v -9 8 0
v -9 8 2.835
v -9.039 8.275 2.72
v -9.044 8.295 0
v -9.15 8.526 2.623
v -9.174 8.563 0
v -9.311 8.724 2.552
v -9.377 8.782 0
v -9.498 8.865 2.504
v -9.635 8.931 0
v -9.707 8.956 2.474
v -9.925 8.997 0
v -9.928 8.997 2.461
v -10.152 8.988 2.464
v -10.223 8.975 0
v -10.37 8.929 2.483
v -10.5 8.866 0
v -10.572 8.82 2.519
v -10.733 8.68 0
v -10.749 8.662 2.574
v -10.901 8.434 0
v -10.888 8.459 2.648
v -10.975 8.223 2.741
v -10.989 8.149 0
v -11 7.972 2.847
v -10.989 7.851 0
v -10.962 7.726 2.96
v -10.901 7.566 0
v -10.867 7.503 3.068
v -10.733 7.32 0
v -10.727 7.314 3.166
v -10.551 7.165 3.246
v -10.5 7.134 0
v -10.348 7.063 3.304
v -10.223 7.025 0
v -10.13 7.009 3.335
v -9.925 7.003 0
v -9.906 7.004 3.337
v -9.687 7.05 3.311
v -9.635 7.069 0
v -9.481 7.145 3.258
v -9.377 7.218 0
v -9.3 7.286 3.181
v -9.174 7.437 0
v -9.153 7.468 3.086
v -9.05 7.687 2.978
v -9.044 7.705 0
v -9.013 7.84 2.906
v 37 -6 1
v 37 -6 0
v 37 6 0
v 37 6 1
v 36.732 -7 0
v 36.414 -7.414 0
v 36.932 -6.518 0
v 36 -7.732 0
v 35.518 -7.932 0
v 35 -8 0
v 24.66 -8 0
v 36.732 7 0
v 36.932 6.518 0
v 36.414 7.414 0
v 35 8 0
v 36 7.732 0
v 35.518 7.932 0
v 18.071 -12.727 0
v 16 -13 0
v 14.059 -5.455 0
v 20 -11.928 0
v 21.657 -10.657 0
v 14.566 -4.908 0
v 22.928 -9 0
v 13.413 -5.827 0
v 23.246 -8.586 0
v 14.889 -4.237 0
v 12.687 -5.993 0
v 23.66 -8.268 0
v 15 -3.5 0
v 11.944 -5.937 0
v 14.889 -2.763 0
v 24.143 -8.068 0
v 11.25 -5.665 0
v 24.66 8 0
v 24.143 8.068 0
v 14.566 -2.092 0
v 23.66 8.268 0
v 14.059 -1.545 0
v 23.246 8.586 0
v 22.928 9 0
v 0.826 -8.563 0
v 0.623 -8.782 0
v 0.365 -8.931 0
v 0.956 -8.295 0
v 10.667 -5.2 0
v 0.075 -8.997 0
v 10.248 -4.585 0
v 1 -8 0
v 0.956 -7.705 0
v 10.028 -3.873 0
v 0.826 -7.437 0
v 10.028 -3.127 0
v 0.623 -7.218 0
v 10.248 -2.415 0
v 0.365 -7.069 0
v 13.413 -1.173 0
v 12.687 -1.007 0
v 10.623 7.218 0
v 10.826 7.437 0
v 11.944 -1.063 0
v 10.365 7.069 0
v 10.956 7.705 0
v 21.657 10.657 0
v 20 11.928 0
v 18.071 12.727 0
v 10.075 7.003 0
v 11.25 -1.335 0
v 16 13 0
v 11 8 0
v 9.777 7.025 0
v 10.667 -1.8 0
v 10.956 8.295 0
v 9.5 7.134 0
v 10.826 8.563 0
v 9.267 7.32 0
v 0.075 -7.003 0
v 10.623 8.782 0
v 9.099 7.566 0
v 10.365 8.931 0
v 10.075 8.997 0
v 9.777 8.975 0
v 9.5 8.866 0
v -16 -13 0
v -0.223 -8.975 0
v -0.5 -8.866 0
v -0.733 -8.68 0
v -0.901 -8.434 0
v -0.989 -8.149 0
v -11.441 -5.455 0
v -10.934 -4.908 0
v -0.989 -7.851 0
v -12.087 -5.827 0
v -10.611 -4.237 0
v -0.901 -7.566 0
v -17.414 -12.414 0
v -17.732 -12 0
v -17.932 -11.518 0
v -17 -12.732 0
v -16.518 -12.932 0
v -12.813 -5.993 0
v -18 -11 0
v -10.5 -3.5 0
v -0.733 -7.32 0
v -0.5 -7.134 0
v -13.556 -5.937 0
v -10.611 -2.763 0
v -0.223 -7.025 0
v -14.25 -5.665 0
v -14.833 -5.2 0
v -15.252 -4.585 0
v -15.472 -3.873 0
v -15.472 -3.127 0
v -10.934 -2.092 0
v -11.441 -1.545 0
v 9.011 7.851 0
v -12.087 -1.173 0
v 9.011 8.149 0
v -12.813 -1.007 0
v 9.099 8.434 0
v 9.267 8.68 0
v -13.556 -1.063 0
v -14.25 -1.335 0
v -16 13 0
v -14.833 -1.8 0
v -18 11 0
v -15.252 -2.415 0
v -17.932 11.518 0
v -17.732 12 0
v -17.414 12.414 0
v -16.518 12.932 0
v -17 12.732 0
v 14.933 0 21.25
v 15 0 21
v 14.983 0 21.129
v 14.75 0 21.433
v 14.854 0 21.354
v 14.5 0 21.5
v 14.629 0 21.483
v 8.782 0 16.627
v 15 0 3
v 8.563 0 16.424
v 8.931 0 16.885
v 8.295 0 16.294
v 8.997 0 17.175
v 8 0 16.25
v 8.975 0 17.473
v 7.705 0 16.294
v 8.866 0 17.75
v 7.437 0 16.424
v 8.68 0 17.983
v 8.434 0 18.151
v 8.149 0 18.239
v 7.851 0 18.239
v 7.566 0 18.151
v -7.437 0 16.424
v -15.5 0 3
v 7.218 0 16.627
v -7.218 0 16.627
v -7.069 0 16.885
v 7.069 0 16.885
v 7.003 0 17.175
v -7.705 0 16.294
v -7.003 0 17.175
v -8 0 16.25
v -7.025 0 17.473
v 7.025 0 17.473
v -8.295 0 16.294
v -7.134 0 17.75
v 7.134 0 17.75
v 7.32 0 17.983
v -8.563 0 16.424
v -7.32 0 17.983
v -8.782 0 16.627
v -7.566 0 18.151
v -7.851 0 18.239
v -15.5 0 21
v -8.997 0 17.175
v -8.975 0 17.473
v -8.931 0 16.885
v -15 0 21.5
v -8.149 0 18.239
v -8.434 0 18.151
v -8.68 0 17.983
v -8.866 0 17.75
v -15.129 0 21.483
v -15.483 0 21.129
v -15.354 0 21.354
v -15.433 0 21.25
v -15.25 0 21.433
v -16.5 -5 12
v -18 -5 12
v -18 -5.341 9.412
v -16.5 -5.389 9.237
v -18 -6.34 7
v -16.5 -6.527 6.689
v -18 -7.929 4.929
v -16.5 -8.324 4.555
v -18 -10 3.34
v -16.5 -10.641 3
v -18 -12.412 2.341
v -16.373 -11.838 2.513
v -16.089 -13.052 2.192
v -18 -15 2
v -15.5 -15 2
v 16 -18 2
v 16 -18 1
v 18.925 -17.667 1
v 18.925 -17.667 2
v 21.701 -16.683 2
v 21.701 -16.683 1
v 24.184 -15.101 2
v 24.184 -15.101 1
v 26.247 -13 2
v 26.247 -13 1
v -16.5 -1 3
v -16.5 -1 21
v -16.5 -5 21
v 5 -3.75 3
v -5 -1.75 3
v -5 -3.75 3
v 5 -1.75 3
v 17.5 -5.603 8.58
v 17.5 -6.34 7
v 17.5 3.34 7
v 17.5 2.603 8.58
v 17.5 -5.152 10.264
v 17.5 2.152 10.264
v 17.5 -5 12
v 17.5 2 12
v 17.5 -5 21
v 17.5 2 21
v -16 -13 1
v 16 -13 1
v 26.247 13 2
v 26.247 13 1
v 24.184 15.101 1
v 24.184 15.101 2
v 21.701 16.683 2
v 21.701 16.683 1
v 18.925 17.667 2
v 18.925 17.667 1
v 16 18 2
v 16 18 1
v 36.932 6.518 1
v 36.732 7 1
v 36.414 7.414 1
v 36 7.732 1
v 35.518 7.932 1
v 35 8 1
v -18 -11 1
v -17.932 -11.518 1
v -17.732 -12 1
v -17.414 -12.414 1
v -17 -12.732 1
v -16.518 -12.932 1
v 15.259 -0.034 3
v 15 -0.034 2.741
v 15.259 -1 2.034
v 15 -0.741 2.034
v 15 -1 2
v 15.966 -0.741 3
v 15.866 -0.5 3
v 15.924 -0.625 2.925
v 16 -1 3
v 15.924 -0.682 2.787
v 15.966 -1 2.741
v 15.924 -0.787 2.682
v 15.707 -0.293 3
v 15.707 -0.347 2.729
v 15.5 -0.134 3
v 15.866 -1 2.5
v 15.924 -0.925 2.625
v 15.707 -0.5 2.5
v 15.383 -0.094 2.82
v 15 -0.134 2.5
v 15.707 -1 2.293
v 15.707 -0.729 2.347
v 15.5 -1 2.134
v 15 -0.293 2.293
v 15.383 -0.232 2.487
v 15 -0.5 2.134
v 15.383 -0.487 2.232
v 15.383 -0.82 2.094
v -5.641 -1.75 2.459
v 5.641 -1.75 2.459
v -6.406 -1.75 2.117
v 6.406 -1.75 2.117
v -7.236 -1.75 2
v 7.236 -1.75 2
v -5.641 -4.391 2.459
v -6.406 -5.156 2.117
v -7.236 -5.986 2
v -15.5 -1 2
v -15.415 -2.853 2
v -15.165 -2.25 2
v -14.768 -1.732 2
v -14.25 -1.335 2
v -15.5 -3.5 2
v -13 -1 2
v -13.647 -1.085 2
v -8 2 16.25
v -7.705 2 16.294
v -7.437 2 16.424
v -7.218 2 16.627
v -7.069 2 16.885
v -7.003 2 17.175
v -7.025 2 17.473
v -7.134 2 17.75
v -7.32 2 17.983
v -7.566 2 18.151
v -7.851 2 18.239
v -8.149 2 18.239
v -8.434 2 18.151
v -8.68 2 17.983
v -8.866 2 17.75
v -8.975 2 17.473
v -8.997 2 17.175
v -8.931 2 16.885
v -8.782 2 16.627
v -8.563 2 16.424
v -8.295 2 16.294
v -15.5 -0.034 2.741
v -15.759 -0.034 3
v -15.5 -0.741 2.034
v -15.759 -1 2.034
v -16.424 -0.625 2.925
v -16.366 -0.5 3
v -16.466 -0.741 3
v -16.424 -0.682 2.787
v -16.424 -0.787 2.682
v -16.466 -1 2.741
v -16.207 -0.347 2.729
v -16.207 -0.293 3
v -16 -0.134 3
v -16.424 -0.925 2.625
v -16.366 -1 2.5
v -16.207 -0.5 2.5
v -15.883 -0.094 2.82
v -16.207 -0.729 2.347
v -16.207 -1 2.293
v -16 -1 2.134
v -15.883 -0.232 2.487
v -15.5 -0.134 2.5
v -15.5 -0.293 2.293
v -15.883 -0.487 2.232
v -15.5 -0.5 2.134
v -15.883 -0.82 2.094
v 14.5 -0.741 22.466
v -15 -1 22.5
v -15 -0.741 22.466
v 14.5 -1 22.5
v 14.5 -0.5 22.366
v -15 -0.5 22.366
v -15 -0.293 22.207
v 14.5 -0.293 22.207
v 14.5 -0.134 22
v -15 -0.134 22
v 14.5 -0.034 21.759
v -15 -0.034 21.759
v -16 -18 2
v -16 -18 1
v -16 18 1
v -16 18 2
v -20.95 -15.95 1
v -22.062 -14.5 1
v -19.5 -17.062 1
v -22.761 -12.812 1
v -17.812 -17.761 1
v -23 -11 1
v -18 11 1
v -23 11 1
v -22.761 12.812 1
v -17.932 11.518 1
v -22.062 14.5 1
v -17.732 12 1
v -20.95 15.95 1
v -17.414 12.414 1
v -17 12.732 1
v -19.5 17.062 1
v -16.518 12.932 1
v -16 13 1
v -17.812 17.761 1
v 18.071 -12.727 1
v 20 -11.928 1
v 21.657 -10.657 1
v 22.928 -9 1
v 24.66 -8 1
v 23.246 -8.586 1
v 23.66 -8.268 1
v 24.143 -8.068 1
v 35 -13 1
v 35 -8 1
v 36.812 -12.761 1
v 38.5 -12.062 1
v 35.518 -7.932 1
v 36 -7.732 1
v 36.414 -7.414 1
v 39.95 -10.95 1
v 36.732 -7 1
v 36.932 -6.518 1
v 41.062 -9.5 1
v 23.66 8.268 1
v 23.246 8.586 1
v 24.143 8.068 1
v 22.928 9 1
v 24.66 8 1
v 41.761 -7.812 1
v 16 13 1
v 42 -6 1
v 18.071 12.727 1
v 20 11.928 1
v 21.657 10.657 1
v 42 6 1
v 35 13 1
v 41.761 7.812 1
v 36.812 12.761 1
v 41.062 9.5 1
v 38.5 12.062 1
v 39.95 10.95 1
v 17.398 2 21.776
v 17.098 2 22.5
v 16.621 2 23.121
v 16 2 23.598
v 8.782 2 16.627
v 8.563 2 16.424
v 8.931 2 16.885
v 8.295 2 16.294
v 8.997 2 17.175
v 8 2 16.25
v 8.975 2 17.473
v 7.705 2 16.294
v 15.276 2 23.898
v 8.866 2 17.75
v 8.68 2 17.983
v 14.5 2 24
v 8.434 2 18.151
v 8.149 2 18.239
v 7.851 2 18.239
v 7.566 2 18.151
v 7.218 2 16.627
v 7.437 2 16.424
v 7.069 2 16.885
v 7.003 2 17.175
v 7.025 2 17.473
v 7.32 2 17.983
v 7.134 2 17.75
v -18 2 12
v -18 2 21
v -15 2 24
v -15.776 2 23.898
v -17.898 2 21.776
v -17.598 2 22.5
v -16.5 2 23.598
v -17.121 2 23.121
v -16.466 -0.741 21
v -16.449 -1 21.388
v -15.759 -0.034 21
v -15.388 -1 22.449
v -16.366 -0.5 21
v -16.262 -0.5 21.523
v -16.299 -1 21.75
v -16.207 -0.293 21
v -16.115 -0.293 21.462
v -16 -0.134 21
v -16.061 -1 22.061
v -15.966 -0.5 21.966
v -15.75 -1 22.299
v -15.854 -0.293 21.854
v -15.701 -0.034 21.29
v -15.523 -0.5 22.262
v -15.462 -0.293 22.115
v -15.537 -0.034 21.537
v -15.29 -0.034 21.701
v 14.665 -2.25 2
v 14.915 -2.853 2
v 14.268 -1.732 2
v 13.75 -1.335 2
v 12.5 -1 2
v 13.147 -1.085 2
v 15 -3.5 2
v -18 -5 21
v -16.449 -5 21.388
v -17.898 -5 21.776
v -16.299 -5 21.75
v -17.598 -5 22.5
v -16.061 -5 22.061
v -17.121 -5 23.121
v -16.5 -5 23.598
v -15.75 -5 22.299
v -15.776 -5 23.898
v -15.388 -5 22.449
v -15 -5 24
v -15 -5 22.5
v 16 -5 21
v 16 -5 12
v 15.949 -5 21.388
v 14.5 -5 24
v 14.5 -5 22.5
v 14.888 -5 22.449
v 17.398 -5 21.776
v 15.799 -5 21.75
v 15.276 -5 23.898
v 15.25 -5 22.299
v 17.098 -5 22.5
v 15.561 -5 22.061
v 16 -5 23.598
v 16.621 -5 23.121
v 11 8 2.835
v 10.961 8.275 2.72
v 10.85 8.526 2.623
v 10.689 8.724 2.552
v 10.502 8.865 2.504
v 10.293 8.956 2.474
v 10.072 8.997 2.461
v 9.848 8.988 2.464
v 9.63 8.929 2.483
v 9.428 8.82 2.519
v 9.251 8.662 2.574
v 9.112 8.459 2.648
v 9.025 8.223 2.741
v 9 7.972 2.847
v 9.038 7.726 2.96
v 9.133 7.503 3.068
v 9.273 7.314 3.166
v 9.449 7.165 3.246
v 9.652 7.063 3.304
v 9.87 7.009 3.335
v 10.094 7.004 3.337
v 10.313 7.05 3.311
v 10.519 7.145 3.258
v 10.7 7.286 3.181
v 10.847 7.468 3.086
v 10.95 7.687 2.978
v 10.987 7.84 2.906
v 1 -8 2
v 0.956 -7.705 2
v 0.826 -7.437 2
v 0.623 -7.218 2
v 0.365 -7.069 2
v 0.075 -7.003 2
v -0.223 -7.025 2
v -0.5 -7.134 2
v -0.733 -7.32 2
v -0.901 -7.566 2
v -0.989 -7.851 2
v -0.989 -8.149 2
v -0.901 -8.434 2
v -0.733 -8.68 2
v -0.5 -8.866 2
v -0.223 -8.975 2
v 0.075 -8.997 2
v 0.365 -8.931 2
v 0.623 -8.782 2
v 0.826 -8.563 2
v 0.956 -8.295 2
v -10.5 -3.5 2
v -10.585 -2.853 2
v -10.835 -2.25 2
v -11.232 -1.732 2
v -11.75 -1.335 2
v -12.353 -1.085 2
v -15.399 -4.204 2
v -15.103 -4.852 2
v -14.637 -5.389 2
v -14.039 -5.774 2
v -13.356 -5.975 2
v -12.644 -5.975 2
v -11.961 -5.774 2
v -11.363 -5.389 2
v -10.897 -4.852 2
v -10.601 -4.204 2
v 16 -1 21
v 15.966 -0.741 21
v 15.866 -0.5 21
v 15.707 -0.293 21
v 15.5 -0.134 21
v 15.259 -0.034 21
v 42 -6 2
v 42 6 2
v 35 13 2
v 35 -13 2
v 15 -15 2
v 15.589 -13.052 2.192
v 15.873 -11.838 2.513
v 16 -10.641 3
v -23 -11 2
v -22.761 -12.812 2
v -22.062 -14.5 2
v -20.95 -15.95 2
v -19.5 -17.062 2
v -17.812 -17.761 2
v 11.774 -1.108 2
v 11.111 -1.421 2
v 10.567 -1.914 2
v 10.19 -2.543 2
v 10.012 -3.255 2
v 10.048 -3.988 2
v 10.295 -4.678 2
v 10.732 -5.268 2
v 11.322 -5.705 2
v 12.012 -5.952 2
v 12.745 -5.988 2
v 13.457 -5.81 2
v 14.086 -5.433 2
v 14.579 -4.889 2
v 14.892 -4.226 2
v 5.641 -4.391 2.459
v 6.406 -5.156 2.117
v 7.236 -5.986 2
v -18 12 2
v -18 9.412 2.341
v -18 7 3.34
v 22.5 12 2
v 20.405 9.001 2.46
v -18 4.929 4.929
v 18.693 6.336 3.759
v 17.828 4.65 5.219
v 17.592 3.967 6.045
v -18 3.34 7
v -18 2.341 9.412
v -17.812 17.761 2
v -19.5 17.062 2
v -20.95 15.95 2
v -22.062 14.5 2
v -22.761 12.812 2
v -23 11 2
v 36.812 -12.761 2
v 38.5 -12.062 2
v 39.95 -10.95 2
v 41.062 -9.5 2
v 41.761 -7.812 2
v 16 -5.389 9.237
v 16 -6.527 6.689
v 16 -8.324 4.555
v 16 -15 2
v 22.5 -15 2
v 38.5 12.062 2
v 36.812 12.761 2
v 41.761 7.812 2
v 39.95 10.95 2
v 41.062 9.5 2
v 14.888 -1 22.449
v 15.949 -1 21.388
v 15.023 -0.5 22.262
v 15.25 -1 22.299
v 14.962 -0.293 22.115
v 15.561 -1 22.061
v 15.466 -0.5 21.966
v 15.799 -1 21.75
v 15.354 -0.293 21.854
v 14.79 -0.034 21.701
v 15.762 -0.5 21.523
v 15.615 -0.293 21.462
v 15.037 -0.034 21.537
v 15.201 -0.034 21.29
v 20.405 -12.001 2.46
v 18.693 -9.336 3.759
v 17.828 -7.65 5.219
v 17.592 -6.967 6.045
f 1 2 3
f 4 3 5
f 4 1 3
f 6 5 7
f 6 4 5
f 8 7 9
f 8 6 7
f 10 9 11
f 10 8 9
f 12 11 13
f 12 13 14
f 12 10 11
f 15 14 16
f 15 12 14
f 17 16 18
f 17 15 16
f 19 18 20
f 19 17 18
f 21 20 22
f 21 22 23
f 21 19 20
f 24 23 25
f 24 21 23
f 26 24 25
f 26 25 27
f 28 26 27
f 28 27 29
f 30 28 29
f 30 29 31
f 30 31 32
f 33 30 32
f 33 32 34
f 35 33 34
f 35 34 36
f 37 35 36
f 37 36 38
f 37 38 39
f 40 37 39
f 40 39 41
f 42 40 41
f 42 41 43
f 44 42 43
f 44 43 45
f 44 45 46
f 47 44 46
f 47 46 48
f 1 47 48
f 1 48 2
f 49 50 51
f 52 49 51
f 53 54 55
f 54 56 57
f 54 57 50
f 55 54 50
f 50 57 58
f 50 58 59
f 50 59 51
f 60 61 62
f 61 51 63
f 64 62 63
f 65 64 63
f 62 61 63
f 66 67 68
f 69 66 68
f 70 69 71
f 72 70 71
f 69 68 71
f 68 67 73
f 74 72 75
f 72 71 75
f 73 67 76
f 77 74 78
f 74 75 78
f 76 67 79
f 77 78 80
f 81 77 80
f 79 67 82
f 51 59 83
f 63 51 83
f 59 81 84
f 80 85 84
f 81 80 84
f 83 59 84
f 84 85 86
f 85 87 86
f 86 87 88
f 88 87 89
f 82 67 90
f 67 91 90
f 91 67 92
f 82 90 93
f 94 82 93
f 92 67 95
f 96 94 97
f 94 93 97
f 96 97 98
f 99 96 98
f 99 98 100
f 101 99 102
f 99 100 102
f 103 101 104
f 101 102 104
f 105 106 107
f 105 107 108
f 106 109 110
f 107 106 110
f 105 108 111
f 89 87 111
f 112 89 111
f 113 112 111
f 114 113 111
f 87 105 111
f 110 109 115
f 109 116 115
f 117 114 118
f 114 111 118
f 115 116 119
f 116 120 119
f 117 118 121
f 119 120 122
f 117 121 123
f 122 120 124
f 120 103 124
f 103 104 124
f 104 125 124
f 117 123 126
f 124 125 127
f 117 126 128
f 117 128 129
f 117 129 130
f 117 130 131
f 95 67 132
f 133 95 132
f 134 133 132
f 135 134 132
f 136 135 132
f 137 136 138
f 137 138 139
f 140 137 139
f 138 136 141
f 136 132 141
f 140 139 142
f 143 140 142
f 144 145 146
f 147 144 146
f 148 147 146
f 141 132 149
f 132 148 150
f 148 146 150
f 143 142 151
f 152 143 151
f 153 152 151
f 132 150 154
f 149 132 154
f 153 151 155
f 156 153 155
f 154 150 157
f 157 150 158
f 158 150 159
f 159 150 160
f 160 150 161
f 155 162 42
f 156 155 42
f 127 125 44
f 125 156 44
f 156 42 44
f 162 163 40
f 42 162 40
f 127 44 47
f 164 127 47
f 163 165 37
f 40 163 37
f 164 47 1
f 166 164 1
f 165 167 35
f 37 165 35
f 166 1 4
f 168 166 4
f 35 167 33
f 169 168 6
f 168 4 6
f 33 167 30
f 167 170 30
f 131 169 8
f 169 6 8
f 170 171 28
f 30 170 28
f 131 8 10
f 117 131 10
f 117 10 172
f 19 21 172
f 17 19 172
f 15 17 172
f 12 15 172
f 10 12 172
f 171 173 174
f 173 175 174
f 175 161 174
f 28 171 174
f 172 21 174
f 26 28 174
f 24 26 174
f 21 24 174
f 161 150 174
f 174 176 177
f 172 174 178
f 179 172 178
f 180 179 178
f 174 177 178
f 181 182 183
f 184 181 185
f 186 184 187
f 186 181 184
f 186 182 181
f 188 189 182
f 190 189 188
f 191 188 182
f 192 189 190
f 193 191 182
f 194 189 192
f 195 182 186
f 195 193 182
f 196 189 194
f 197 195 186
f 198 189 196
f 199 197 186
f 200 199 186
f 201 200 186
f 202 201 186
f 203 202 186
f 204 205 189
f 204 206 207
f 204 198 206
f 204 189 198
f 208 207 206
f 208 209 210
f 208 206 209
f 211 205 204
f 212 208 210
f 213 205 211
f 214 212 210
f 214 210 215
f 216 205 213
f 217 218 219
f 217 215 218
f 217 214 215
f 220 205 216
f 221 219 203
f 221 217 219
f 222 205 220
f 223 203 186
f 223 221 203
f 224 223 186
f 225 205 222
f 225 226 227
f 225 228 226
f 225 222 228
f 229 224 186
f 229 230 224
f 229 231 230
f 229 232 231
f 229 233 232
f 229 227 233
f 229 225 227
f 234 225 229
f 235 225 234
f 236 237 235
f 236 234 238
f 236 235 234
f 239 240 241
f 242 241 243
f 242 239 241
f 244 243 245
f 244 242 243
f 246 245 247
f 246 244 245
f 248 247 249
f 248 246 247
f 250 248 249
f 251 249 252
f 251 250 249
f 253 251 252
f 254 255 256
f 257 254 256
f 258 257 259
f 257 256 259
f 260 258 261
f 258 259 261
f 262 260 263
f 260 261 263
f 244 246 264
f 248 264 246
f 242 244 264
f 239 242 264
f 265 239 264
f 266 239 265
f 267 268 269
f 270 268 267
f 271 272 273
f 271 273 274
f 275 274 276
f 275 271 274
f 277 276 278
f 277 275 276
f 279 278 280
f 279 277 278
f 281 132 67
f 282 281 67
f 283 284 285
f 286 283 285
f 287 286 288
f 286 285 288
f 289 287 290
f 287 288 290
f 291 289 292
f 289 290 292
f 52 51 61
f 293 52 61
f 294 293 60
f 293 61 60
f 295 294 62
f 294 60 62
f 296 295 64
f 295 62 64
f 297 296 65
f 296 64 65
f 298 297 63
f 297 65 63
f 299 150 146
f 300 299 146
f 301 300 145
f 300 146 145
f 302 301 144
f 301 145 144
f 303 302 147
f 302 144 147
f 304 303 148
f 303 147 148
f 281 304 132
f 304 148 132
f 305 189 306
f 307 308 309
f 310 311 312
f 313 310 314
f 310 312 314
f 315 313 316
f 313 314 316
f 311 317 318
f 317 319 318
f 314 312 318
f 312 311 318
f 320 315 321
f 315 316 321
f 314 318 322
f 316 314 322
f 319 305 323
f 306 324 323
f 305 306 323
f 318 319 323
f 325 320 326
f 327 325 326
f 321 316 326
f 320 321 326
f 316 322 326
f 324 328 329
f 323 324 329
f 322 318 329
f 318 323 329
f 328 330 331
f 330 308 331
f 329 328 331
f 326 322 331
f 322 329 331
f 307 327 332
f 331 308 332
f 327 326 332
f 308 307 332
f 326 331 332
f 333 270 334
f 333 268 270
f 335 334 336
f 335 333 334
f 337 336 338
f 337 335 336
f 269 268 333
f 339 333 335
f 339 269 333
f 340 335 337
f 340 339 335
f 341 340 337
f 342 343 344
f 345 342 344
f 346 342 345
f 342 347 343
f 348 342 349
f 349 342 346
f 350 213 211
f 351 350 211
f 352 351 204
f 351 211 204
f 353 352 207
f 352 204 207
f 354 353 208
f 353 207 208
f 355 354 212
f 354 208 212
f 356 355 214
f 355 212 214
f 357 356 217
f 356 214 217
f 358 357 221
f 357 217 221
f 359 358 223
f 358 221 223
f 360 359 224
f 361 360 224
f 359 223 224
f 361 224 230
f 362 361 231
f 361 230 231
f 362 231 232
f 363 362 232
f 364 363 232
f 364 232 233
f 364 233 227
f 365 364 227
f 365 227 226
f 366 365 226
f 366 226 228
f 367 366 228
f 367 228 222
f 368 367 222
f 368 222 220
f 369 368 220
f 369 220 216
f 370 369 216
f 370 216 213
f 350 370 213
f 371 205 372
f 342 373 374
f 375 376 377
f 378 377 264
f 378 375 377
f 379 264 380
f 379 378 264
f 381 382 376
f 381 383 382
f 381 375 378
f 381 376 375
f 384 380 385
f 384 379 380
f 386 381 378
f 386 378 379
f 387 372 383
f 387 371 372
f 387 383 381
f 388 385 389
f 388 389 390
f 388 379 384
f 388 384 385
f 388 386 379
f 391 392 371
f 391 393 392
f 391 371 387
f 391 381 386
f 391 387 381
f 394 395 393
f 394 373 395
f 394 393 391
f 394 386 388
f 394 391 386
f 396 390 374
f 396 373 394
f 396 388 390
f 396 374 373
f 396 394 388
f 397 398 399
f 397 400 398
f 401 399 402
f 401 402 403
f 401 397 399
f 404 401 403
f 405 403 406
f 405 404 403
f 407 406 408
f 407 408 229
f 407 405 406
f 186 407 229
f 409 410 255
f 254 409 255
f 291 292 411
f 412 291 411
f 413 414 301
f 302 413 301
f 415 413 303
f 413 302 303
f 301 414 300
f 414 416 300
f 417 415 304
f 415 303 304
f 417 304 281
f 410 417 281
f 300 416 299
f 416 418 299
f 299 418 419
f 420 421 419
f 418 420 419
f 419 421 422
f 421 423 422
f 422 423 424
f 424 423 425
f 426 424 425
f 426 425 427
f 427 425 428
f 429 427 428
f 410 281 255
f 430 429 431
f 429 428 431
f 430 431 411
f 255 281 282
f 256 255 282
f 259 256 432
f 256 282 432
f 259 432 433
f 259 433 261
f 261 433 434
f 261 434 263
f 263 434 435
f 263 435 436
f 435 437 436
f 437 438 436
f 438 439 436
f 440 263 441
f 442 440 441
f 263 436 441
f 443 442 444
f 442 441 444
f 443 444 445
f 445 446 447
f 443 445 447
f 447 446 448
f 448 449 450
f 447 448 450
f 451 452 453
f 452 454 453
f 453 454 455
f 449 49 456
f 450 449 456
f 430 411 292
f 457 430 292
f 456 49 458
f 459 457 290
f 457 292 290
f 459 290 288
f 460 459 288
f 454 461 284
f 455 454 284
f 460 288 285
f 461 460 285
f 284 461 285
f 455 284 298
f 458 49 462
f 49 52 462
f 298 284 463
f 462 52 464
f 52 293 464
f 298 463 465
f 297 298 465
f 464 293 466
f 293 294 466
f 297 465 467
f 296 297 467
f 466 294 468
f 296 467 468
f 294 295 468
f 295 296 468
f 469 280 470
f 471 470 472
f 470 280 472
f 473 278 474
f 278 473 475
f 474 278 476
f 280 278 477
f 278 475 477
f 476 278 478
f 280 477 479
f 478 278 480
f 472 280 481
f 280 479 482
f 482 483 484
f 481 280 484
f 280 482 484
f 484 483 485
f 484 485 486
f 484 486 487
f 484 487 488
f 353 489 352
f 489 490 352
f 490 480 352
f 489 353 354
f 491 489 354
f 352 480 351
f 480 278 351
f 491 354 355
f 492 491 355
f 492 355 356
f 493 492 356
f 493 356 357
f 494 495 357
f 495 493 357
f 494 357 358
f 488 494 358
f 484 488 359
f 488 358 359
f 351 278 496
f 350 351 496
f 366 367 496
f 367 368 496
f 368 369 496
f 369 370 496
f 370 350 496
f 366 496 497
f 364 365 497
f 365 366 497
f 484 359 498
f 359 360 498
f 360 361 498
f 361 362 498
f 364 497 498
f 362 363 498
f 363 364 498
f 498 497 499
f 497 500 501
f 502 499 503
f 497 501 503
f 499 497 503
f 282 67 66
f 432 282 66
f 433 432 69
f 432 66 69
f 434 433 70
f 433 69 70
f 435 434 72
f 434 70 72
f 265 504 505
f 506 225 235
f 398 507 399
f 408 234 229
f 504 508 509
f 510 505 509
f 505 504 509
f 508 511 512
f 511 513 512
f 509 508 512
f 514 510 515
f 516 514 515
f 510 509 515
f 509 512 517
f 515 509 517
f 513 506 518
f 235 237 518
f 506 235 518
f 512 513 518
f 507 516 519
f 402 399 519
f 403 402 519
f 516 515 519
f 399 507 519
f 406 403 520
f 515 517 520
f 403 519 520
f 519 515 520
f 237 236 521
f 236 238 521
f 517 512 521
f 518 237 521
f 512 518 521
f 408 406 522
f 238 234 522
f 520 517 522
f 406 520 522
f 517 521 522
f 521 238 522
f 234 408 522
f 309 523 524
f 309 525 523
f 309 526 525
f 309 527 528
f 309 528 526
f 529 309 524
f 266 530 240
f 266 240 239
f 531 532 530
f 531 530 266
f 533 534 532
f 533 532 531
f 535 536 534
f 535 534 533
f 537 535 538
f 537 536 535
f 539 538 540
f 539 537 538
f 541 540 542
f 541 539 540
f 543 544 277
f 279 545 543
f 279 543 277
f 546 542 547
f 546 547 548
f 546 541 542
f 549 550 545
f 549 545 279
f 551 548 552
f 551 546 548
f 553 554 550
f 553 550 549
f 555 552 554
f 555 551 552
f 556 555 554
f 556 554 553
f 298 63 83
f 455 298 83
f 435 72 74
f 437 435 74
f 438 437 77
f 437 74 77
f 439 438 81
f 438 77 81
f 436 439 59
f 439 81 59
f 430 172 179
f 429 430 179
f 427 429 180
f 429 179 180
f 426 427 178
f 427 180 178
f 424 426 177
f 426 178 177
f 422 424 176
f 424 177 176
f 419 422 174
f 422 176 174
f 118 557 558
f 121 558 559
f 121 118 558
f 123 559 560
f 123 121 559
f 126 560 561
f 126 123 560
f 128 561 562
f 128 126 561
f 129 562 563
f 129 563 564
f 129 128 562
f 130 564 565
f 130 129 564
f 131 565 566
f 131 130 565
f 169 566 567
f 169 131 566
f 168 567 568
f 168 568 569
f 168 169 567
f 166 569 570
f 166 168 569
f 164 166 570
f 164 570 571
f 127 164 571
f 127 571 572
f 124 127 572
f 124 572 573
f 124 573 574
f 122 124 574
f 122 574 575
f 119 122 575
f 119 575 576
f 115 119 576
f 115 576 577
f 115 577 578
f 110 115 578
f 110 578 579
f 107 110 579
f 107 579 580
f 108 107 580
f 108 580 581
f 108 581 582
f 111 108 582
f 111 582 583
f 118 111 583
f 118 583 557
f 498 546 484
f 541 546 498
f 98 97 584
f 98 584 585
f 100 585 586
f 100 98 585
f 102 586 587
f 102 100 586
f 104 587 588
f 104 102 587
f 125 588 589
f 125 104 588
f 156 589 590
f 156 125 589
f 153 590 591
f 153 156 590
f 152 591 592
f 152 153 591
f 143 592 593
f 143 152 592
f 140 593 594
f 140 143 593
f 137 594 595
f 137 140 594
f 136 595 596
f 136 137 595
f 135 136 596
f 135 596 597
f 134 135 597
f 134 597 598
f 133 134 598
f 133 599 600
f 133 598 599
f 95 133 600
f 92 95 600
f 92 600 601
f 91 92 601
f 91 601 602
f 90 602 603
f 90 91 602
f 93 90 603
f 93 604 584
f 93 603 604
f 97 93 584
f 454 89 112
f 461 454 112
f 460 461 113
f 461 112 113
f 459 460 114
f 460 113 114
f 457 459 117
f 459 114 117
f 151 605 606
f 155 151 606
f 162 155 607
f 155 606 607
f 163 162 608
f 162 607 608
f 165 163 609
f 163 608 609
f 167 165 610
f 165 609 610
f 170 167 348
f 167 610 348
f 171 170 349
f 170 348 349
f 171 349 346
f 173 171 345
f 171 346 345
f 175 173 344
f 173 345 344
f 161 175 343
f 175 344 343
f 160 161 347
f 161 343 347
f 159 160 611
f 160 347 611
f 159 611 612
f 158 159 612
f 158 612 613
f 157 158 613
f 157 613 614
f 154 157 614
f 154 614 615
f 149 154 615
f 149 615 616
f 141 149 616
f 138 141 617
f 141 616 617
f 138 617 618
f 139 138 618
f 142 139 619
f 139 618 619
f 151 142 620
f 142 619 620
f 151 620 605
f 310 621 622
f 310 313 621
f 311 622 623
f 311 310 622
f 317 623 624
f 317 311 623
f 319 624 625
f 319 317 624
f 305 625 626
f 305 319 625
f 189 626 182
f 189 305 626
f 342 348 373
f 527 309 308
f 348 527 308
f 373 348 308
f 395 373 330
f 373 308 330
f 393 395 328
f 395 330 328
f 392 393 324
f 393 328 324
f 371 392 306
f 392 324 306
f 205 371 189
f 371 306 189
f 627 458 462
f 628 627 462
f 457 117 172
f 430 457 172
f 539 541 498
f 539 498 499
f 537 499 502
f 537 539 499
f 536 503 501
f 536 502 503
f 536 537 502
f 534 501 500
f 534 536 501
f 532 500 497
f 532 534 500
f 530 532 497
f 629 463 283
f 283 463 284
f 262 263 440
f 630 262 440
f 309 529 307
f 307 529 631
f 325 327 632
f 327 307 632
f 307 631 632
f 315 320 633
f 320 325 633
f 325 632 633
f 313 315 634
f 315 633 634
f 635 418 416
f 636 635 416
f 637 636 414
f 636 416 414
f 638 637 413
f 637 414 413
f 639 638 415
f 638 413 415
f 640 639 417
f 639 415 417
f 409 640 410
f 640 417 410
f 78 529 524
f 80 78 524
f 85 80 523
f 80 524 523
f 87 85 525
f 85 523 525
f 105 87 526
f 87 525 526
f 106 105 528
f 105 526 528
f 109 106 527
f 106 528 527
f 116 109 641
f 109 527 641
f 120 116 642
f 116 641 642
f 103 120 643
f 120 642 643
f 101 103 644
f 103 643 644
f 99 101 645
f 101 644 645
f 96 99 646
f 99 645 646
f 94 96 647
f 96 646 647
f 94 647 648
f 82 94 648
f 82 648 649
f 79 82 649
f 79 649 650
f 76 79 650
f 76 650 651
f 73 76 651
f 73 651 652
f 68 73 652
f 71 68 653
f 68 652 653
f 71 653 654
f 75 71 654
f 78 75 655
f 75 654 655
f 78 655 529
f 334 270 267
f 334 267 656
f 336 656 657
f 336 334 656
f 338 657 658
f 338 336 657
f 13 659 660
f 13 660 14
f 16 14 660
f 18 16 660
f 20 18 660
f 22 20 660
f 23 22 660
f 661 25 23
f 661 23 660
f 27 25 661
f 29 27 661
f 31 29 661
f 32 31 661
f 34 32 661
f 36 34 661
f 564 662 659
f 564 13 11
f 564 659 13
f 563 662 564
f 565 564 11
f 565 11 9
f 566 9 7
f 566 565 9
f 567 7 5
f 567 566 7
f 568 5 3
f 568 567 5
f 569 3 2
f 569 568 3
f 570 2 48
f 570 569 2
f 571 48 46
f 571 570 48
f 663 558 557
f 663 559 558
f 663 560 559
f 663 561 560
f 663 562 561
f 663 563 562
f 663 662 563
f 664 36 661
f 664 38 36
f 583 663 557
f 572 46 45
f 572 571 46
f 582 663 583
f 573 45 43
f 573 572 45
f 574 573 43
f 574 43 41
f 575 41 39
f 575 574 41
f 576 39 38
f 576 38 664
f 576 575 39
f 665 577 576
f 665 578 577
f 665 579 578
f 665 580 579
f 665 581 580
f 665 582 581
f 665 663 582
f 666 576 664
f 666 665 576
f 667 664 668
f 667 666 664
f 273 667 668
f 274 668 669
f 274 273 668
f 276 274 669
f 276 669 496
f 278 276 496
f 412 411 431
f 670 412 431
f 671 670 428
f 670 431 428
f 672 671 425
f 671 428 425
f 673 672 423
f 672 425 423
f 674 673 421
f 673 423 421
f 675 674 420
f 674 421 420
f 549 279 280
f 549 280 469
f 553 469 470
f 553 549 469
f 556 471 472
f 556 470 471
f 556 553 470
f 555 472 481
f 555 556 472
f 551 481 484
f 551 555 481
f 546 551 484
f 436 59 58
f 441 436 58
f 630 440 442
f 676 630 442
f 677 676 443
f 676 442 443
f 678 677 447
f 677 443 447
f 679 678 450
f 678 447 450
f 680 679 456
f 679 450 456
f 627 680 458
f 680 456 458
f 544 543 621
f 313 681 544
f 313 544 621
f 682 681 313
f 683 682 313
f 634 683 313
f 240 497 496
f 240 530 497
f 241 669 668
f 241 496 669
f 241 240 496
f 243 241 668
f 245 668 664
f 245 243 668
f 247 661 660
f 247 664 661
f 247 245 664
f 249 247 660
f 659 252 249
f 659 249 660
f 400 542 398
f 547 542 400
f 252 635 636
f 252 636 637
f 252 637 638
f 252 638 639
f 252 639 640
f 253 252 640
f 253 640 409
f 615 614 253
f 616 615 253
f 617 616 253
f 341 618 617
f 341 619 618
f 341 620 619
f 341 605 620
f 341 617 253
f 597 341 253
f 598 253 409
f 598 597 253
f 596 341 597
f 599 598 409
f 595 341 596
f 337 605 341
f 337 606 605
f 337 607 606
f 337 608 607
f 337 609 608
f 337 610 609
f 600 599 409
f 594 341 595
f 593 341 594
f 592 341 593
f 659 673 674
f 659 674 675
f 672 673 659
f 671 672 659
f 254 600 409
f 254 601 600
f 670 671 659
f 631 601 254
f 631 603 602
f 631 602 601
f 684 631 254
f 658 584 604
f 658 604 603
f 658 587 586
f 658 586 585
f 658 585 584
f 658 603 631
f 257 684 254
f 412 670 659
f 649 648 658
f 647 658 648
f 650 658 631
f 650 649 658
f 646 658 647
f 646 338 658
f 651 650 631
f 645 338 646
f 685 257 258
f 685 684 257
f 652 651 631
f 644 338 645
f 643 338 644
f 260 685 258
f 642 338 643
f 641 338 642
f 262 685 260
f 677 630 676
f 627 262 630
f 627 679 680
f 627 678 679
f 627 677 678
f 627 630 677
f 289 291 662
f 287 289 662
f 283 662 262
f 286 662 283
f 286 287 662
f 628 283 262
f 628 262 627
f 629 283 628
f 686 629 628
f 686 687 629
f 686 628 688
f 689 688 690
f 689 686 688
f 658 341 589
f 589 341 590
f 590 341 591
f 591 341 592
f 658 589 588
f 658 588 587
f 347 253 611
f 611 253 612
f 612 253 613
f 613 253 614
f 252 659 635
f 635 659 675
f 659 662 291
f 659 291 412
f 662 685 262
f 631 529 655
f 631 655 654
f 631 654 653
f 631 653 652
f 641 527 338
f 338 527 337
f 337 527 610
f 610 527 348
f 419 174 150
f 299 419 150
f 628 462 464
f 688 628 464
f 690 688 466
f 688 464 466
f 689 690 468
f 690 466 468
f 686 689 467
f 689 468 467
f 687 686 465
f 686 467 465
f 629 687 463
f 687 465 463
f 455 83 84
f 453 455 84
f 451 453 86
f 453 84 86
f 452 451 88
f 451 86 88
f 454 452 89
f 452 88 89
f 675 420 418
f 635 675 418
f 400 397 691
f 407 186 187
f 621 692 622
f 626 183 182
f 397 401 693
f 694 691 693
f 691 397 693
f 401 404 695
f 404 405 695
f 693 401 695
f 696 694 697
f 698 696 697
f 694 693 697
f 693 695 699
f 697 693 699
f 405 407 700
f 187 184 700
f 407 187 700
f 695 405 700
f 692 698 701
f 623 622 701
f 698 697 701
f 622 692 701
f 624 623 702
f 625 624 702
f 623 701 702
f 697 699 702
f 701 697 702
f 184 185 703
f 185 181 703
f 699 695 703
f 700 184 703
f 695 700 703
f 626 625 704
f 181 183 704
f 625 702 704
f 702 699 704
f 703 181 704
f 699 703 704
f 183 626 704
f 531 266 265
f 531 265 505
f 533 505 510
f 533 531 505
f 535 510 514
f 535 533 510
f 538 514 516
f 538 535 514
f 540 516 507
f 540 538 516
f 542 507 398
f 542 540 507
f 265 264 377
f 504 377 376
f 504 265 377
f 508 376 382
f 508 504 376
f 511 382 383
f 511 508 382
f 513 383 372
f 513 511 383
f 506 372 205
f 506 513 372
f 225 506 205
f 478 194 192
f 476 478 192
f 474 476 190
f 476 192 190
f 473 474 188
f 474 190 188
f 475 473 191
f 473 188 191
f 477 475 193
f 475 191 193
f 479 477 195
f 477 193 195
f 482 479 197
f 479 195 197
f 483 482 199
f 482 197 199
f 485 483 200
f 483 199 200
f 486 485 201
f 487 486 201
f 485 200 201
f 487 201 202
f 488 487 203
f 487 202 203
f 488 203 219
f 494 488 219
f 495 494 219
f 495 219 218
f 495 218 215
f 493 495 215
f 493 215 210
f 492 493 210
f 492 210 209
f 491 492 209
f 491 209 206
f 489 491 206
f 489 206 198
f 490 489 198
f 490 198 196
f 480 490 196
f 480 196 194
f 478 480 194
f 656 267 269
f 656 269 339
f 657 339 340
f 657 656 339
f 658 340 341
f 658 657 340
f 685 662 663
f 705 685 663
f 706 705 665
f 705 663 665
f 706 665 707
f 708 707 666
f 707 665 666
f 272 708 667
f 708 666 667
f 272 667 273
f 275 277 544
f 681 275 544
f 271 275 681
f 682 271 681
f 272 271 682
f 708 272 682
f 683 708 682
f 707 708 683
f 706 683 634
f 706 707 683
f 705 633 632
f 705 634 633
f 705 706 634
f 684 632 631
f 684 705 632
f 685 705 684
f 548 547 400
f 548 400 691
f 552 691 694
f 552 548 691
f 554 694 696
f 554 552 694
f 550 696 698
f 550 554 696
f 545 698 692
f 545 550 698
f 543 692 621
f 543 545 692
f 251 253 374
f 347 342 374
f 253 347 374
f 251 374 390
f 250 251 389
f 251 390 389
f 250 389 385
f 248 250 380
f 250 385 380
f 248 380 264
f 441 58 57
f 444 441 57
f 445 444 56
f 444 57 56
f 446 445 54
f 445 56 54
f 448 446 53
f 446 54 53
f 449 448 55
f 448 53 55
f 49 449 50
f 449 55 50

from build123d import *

# Parameters (mm, degrees)
INSERT_IN_SHEET_METAL_HOLE_DEPTH  = 1
BOSS_EXTRUDE5_DEPTH               = 1
SKETCH2_W                         = 24
SKETCH2_H                         = 2
LED_BACKING_DEPTH                 = 55
SKETCH3_R                         = 1
LED_SCREWHOLES_DEPTH              = 10
LED_BACKING_CLEANUP_DEPTH         = 52.613951602
LED_BACKING_CLEANUP_DEPTH_BACK    = 52.613951602
SKETCH5_W                         = 19.5
SKETCH5_H                         = 22
FILLET1_R                         = 3
BOSS_EXTRUDE3_START               = 5
BOSS_EXTRUDE3_DEPTH               = 5
FILLET2_R                         = 10
FILLET3_R                         = 5
FILLET4_R                         = 1
SKETCH7_R                         = 2.5
LED_WIRE_HOLES_DEPTH              = 51.714889332
SCREWHOLES_FOR_BACKING_DEPTH      = 51.714889332
SCREWHOLES_FOR_BACKING_DEPTH_BACK = 51.714889332
SKETCH8_R                         = 1
SKETCH9_W                         = 10
SKETCH9_H                         = 2
BOSS_EXTRUDE4_DEPTH               = 1
FILLET5_R                         = 3


with BuildPart() as part:
    # Sketch1 → Insert in sheet metal hole (new body)
    with BuildSketch(Plane.XY):
        with BuildLine():
            Line((-18, 11), (-18, -11))
            ThreePointArc((-18, -11), (-17.414213562, -12.414213562), (-16, -13))
            Line((-16, -13), (16, -13))
            ThreePointArc((16, -13), (20, -11.92820323), (22.92820323, -9))
            ThreePointArc((22.92820323, -9), (23.660254038, -8.267949192), (24.660254038, -8))
            Line((24.660254038, -8), (35, -8))
            ThreePointArc((35, -8), (36.414213562, -7.414213562), (37, -6))
            Line((37, -6), (37, 6))
            ThreePointArc((37, 6), (36.414213562, 7.414213562), (35, 8))
            Line((35, 8), (24.660254038, 8))
            ThreePointArc((24.660254038, 8), (23.660254038, 8.267949192), (22.92820323, 9))
            ThreePointArc((22.92820323, 9), (20, 11.92820323), (16, 13))
            Line((16, 13), (-16, 13))
            ThreePointArc((-16, 13), (-17.414213562, 12.414213562), (-18, 11))
        make_face()
    extrude(amount=INSERT_IN_SHEET_METAL_HOLE_DEPTH)

    # Sketch10 → Boss-Extrude5 (add)
    with BuildSketch(Plane.XY.offset(1)):
        with BuildLine():
            Line((26.246950766, -13), (35, -13))
            ThreePointArc((35, -13), (39.949747468, -10.949747468), (42, -6))
            Line((42, -6), (42, 6))
            ThreePointArc((42, 6), (39.949747468, 10.949747468), (35, 13))
            Line((35, 13), (26.246950766, 13))
            ThreePointArc((26.246950766, 13), (21.700877125, 16.683321446), (16, 18))
            Line((16, 18), (-16, 18))
            ThreePointArc((-16, 18), (-20.949747468, 15.949747468), (-23, 11))
            Line((-23, 11), (-23, -11))
            ThreePointArc((-23, -11), (-20.949747468, -15.949747468), (-16, -18))
            Line((-16, -18), (16, -18))
            ThreePointArc((16, -18), (21.700877125, -16.683321446), (26.246950766, -13))
        make_face()
    extrude(amount=BOSS_EXTRUDE5_DEPTH)

    # Sketch2 → LED backing (add)
    with BuildSketch(Plane.ZY.offset(18)):
        with Locations((12, 1)):
            Rectangle(SKETCH2_W, SKETCH2_H)
    extrude(amount=-LED_BACKING_DEPTH)

    # Sketch3 → LED screwholes (cut)
    with BuildSketch(Plane.XZ):
        with Locations(Location((-8, 17.25, 0), (0, 0, 270))):
            Circle(SKETCH3_R)
        with Locations(Location((8, 17.25, 0), (0, 0, 270))):
            Circle(SKETCH3_R)
    extrude(amount=-LED_SCREWHOLES_DEPTH, mode=Mode.SUBTRACT)

    # Sketch5 → LED backing cleanup (cut, two sides: drawn at the far end of the back side and taken through both)
    with BuildSketch(Plane.XZ.offset(-LED_BACKING_CLEANUP_DEPTH_BACK)):
        with Locations((27.25, 13)):
            Rectangle(SKETCH5_W, SKETCH5_H)
    extrude(amount=LED_BACKING_CLEANUP_DEPTH + LED_BACKING_CLEANUP_DEPTH_BACK, mode=Mode.SUBTRACT)

    # Fillet1
    fillet1_edges = [part.edges().sort_by_distance(p)[0] for p in [
        (17.5, 1, 24),
        (-18, 1, 24),
    ]]
    fillet(fillet1_edges, radius=FILLET1_R)

    # Sketch6 → Boss-Extrude3 (add)
    with BuildSketch(Plane.XZ.offset(BOSS_EXTRUDE3_START)):
        with BuildLine():
            Line((14.5, 24), (-15, 24))
            ThreePointArc((-15, 24), (-17.121320344, 23.121320344), (-18, 21))
            Line((-18, 21), (-18, 2))
            Line((-18, 2), (-16.5, 2))
            Line((-16.5, 2), (-16.5, 3.5))
            Line((-16.5, 3.5), (-16.5, 21))
            ThreePointArc((-16.5, 21), (-16.060660172, 22.060660172), (-15, 22.5))
            Line((-15, 22.5), (14.5, 22.5))
            ThreePointArc((14.5, 22.5), (15.560660172, 22.060660172), (16, 21))
            Line((16, 21), (16, 3.5))
            Line((16, 3.5), (16, 2))
            Line((16, 2), (17.5, 2))
            Line((17.5, 2), (17.5, 21))
            ThreePointArc((17.5, 21), (16.621320344, 23.121320344), (14.5, 24))
        make_face()
    extrude(amount=-BOSS_EXTRUDE3_DEPTH)

    # Fillet2
    fillet2_edges = [part.edges().sort_by_distance(p)[0] for p in [
        (-0.25, 2, 2),
        (-17.25, -5, 2),
        (16.75, -5, 2),
    ]]
    fillet(fillet2_edges, radius=FILLET2_R)

    # Fillet3
    fillet3_edges = [part.edges().sort_by_distance(p)[0] for p in [
        (17.5, -1.5, 2),
    ]]
    fillet(fillet3_edges, radius=FILLET3_R)

    # Fillet4
    fillet4_edges = [part.edges().sort_by_distance(p)[0] for p in [
        (-0.25, 0, 2),
        (-16.5, 0, 11.5),
        (-16.5, -7.5, 2),
        (-16.060660172, 0, 22.060660172),
        (-0.25, 0, 22.5),
        (15.560660172, 0, 22.060660172),
        (16, 0, 11.5),
        (16, -7.5, 2),
    ]]
    fillet(fillet4_edges, radius=FILLET4_R)

    # Sketch7 → LED wire holes (cut, through all)
    with BuildSketch(Plane.XY.offset(2)):
        with Locations((-13, -3.5)):
            Circle(SKETCH7_R)
        with Locations((12.5, -3.5)):
            Circle(SKETCH7_R)
    extrude(amount=-LED_WIRE_HOLES_DEPTH, mode=Mode.SUBTRACT)

    # Sketch8 → Screwholes for backing (cut, two sides: drawn at the far end of the back side and taken through both)
    with BuildSketch(Plane.XY.offset(2).offset(-SCREWHOLES_FOR_BACKING_DEPTH_BACK)):
        with Locations((0, -8)):
            Circle(SKETCH8_R)
        with Locations((-10, 8)):
            Circle(SKETCH8_R)
        with Locations((10, 8)):
            Circle(SKETCH8_R)
    extrude(amount=SCREWHOLES_FOR_BACKING_DEPTH + SCREWHOLES_FOR_BACKING_DEPTH_BACK, mode=Mode.SUBTRACT)

    # Sketch9 → Boss-Extrude4 (add)
    with BuildSketch(Plane.XY.offset(2)):
        with Locations((0, -2.75)):
            Rectangle(SKETCH9_W, SKETCH9_H)
    extrude(amount=BOSS_EXTRUDE4_DEPTH)

    # Fillet5
    # the kernel refuses this fillet: 3 mm, written as the material it adds along each edge
    with BuildSketch(Plane(origin=(5, -1.75, 2), x_dir=(1, 0, 0), z_dir=(0, -1, 0)), Plane(origin=(-5, -3.75, 2), x_dir=(-1, 0, 0), z_dir=(0, 1, 0))) as fillet5_piece_1:
        with BuildLine():
            CenterArc((2.236067977, 3), FILLET5_R, 221.810314896, 48.189685104)
            Line((0, 1), (0, 0))
            Line((0, 0), (2.236067977, 0))
        make_face()
    extrude(amount=2)
    with BuildSketch(Plane(origin=(5, -3.75, 2), x_dir=(0, -1, 0), z_dir=(-1, 0, 0))) as fillet5_piece_2:
        with BuildLine():
            CenterArc((2.236067977, 3), FILLET5_R, 221.810314896, 48.189685104)
            Line((0, 1), (0, 0))
            Line((0, 0), (2.236067977, 0))
        make_face()
    extrude(amount=10)
    with BuildSketch(Plane(origin=(10.590169944, -3.75, 2), x_dir=(0, -1, 0), z_dir=(-1, 0, 0))) as fillet5_piece_3a_section:
        with BuildLine():
            CenterArc((2.236067977, 3), FILLET5_R, 221.810314896, 48.189685104)
            Line((0, 1), (0, 0))
            Line((0, 0), (2.236067977, 0))
        make_face()
    fillet5_piece_3a = extrude(amount=15.590169944, mode=Mode.PRIVATE)
    fillet5_piece_3a = fillet5_piece_3a - Plane(origin=(12.5, -3.5, 2), x_dir=(1, 0, 0), z_dir=(0, 0, 1)) * Cylinder(2.5, 41, mode=Mode.PRIVATE)
    fillet5_piece_3a = split(fillet5_piece_3a, bisect_by=Plane(origin=(5, -3.75, 2), z_dir=(1, 0, 0)), keep=Keep.TOP, mode=Mode.PRIVATE)
    with BuildSketch(Plane(origin=(5, -1.75, 2), x_dir=(1, 0, 0), z_dir=(0, -1, 0))) as fillet5_piece_3b_section:
        with BuildLine():
            CenterArc((2.236067977, 3), FILLET5_R, 221.810314896, 48.189685104)
            Line((0, 1), (0, 0))
            Line((0, 0), (2.236067977, 0))
        make_face()
    fillet5_piece_3b = extrude(amount=7.590169944, mode=Mode.PRIVATE)
    fillet5_piece_3b = split(fillet5_piece_3b, bisect_by=Plane(origin=(5, -3.75, 2), z_dir=(0, -1, 0)), keep=Keep.TOP, mode=Mode.PRIVATE)
    fillet5_piece_3 = fillet5_piece_3a & fillet5_piece_3b
    add(fillet5_piece_3)
    with BuildSketch(Plane(origin=(-5, -9.340169944, 2), x_dir=(-1, 0, 0), z_dir=(0, 1, 0))) as fillet5_piece_4a_section:
        with BuildLine():
            CenterArc((2.236067977, 3), FILLET5_R, 221.810314896, 48.189685104)
            Line((0, 1), (0, 0))
            Line((0, 0), (2.236067977, 0))
        make_face()
    fillet5_piece_4a = extrude(amount=7.590169944, mode=Mode.PRIVATE)
    fillet5_piece_4a = split(fillet5_piece_4a, bisect_by=Plane(origin=(-5, -3.75, 2), z_dir=(0, -1, 0)), keep=Keep.TOP, mode=Mode.PRIVATE)
    with BuildSketch(Plane(origin=(5, -3.75, 2), x_dir=(0, -1, 0), z_dir=(-1, 0, 0))) as fillet5_piece_4b_section:
        with BuildLine():
            CenterArc((2.236067977, 3), FILLET5_R, 221.810314896, 48.189685104)
            Line((0, 1), (0, 0))
            Line((0, 0), (2.236067977, 0))
        make_face()
    fillet5_piece_4b = extrude(amount=15.590169944, mode=Mode.PRIVATE)
    fillet5_piece_4b = split(fillet5_piece_4b, bisect_by=Plane(origin=(-5, -3.75, 2), z_dir=(-1, 0, 0)), keep=Keep.TOP, mode=Mode.PRIVATE)
    fillet5_piece_4b = fillet5_piece_4b - Plane(origin=(-13, -3.5, 2), x_dir=(1, 0, 0), z_dir=(0, 0, 1)) * Cylinder(2.5, 41, mode=Mode.PRIVATE)
    fillet5_piece_4 = fillet5_piece_4a & fillet5_piece_4b
    add(fillet5_piece_4)


solid = part.part
